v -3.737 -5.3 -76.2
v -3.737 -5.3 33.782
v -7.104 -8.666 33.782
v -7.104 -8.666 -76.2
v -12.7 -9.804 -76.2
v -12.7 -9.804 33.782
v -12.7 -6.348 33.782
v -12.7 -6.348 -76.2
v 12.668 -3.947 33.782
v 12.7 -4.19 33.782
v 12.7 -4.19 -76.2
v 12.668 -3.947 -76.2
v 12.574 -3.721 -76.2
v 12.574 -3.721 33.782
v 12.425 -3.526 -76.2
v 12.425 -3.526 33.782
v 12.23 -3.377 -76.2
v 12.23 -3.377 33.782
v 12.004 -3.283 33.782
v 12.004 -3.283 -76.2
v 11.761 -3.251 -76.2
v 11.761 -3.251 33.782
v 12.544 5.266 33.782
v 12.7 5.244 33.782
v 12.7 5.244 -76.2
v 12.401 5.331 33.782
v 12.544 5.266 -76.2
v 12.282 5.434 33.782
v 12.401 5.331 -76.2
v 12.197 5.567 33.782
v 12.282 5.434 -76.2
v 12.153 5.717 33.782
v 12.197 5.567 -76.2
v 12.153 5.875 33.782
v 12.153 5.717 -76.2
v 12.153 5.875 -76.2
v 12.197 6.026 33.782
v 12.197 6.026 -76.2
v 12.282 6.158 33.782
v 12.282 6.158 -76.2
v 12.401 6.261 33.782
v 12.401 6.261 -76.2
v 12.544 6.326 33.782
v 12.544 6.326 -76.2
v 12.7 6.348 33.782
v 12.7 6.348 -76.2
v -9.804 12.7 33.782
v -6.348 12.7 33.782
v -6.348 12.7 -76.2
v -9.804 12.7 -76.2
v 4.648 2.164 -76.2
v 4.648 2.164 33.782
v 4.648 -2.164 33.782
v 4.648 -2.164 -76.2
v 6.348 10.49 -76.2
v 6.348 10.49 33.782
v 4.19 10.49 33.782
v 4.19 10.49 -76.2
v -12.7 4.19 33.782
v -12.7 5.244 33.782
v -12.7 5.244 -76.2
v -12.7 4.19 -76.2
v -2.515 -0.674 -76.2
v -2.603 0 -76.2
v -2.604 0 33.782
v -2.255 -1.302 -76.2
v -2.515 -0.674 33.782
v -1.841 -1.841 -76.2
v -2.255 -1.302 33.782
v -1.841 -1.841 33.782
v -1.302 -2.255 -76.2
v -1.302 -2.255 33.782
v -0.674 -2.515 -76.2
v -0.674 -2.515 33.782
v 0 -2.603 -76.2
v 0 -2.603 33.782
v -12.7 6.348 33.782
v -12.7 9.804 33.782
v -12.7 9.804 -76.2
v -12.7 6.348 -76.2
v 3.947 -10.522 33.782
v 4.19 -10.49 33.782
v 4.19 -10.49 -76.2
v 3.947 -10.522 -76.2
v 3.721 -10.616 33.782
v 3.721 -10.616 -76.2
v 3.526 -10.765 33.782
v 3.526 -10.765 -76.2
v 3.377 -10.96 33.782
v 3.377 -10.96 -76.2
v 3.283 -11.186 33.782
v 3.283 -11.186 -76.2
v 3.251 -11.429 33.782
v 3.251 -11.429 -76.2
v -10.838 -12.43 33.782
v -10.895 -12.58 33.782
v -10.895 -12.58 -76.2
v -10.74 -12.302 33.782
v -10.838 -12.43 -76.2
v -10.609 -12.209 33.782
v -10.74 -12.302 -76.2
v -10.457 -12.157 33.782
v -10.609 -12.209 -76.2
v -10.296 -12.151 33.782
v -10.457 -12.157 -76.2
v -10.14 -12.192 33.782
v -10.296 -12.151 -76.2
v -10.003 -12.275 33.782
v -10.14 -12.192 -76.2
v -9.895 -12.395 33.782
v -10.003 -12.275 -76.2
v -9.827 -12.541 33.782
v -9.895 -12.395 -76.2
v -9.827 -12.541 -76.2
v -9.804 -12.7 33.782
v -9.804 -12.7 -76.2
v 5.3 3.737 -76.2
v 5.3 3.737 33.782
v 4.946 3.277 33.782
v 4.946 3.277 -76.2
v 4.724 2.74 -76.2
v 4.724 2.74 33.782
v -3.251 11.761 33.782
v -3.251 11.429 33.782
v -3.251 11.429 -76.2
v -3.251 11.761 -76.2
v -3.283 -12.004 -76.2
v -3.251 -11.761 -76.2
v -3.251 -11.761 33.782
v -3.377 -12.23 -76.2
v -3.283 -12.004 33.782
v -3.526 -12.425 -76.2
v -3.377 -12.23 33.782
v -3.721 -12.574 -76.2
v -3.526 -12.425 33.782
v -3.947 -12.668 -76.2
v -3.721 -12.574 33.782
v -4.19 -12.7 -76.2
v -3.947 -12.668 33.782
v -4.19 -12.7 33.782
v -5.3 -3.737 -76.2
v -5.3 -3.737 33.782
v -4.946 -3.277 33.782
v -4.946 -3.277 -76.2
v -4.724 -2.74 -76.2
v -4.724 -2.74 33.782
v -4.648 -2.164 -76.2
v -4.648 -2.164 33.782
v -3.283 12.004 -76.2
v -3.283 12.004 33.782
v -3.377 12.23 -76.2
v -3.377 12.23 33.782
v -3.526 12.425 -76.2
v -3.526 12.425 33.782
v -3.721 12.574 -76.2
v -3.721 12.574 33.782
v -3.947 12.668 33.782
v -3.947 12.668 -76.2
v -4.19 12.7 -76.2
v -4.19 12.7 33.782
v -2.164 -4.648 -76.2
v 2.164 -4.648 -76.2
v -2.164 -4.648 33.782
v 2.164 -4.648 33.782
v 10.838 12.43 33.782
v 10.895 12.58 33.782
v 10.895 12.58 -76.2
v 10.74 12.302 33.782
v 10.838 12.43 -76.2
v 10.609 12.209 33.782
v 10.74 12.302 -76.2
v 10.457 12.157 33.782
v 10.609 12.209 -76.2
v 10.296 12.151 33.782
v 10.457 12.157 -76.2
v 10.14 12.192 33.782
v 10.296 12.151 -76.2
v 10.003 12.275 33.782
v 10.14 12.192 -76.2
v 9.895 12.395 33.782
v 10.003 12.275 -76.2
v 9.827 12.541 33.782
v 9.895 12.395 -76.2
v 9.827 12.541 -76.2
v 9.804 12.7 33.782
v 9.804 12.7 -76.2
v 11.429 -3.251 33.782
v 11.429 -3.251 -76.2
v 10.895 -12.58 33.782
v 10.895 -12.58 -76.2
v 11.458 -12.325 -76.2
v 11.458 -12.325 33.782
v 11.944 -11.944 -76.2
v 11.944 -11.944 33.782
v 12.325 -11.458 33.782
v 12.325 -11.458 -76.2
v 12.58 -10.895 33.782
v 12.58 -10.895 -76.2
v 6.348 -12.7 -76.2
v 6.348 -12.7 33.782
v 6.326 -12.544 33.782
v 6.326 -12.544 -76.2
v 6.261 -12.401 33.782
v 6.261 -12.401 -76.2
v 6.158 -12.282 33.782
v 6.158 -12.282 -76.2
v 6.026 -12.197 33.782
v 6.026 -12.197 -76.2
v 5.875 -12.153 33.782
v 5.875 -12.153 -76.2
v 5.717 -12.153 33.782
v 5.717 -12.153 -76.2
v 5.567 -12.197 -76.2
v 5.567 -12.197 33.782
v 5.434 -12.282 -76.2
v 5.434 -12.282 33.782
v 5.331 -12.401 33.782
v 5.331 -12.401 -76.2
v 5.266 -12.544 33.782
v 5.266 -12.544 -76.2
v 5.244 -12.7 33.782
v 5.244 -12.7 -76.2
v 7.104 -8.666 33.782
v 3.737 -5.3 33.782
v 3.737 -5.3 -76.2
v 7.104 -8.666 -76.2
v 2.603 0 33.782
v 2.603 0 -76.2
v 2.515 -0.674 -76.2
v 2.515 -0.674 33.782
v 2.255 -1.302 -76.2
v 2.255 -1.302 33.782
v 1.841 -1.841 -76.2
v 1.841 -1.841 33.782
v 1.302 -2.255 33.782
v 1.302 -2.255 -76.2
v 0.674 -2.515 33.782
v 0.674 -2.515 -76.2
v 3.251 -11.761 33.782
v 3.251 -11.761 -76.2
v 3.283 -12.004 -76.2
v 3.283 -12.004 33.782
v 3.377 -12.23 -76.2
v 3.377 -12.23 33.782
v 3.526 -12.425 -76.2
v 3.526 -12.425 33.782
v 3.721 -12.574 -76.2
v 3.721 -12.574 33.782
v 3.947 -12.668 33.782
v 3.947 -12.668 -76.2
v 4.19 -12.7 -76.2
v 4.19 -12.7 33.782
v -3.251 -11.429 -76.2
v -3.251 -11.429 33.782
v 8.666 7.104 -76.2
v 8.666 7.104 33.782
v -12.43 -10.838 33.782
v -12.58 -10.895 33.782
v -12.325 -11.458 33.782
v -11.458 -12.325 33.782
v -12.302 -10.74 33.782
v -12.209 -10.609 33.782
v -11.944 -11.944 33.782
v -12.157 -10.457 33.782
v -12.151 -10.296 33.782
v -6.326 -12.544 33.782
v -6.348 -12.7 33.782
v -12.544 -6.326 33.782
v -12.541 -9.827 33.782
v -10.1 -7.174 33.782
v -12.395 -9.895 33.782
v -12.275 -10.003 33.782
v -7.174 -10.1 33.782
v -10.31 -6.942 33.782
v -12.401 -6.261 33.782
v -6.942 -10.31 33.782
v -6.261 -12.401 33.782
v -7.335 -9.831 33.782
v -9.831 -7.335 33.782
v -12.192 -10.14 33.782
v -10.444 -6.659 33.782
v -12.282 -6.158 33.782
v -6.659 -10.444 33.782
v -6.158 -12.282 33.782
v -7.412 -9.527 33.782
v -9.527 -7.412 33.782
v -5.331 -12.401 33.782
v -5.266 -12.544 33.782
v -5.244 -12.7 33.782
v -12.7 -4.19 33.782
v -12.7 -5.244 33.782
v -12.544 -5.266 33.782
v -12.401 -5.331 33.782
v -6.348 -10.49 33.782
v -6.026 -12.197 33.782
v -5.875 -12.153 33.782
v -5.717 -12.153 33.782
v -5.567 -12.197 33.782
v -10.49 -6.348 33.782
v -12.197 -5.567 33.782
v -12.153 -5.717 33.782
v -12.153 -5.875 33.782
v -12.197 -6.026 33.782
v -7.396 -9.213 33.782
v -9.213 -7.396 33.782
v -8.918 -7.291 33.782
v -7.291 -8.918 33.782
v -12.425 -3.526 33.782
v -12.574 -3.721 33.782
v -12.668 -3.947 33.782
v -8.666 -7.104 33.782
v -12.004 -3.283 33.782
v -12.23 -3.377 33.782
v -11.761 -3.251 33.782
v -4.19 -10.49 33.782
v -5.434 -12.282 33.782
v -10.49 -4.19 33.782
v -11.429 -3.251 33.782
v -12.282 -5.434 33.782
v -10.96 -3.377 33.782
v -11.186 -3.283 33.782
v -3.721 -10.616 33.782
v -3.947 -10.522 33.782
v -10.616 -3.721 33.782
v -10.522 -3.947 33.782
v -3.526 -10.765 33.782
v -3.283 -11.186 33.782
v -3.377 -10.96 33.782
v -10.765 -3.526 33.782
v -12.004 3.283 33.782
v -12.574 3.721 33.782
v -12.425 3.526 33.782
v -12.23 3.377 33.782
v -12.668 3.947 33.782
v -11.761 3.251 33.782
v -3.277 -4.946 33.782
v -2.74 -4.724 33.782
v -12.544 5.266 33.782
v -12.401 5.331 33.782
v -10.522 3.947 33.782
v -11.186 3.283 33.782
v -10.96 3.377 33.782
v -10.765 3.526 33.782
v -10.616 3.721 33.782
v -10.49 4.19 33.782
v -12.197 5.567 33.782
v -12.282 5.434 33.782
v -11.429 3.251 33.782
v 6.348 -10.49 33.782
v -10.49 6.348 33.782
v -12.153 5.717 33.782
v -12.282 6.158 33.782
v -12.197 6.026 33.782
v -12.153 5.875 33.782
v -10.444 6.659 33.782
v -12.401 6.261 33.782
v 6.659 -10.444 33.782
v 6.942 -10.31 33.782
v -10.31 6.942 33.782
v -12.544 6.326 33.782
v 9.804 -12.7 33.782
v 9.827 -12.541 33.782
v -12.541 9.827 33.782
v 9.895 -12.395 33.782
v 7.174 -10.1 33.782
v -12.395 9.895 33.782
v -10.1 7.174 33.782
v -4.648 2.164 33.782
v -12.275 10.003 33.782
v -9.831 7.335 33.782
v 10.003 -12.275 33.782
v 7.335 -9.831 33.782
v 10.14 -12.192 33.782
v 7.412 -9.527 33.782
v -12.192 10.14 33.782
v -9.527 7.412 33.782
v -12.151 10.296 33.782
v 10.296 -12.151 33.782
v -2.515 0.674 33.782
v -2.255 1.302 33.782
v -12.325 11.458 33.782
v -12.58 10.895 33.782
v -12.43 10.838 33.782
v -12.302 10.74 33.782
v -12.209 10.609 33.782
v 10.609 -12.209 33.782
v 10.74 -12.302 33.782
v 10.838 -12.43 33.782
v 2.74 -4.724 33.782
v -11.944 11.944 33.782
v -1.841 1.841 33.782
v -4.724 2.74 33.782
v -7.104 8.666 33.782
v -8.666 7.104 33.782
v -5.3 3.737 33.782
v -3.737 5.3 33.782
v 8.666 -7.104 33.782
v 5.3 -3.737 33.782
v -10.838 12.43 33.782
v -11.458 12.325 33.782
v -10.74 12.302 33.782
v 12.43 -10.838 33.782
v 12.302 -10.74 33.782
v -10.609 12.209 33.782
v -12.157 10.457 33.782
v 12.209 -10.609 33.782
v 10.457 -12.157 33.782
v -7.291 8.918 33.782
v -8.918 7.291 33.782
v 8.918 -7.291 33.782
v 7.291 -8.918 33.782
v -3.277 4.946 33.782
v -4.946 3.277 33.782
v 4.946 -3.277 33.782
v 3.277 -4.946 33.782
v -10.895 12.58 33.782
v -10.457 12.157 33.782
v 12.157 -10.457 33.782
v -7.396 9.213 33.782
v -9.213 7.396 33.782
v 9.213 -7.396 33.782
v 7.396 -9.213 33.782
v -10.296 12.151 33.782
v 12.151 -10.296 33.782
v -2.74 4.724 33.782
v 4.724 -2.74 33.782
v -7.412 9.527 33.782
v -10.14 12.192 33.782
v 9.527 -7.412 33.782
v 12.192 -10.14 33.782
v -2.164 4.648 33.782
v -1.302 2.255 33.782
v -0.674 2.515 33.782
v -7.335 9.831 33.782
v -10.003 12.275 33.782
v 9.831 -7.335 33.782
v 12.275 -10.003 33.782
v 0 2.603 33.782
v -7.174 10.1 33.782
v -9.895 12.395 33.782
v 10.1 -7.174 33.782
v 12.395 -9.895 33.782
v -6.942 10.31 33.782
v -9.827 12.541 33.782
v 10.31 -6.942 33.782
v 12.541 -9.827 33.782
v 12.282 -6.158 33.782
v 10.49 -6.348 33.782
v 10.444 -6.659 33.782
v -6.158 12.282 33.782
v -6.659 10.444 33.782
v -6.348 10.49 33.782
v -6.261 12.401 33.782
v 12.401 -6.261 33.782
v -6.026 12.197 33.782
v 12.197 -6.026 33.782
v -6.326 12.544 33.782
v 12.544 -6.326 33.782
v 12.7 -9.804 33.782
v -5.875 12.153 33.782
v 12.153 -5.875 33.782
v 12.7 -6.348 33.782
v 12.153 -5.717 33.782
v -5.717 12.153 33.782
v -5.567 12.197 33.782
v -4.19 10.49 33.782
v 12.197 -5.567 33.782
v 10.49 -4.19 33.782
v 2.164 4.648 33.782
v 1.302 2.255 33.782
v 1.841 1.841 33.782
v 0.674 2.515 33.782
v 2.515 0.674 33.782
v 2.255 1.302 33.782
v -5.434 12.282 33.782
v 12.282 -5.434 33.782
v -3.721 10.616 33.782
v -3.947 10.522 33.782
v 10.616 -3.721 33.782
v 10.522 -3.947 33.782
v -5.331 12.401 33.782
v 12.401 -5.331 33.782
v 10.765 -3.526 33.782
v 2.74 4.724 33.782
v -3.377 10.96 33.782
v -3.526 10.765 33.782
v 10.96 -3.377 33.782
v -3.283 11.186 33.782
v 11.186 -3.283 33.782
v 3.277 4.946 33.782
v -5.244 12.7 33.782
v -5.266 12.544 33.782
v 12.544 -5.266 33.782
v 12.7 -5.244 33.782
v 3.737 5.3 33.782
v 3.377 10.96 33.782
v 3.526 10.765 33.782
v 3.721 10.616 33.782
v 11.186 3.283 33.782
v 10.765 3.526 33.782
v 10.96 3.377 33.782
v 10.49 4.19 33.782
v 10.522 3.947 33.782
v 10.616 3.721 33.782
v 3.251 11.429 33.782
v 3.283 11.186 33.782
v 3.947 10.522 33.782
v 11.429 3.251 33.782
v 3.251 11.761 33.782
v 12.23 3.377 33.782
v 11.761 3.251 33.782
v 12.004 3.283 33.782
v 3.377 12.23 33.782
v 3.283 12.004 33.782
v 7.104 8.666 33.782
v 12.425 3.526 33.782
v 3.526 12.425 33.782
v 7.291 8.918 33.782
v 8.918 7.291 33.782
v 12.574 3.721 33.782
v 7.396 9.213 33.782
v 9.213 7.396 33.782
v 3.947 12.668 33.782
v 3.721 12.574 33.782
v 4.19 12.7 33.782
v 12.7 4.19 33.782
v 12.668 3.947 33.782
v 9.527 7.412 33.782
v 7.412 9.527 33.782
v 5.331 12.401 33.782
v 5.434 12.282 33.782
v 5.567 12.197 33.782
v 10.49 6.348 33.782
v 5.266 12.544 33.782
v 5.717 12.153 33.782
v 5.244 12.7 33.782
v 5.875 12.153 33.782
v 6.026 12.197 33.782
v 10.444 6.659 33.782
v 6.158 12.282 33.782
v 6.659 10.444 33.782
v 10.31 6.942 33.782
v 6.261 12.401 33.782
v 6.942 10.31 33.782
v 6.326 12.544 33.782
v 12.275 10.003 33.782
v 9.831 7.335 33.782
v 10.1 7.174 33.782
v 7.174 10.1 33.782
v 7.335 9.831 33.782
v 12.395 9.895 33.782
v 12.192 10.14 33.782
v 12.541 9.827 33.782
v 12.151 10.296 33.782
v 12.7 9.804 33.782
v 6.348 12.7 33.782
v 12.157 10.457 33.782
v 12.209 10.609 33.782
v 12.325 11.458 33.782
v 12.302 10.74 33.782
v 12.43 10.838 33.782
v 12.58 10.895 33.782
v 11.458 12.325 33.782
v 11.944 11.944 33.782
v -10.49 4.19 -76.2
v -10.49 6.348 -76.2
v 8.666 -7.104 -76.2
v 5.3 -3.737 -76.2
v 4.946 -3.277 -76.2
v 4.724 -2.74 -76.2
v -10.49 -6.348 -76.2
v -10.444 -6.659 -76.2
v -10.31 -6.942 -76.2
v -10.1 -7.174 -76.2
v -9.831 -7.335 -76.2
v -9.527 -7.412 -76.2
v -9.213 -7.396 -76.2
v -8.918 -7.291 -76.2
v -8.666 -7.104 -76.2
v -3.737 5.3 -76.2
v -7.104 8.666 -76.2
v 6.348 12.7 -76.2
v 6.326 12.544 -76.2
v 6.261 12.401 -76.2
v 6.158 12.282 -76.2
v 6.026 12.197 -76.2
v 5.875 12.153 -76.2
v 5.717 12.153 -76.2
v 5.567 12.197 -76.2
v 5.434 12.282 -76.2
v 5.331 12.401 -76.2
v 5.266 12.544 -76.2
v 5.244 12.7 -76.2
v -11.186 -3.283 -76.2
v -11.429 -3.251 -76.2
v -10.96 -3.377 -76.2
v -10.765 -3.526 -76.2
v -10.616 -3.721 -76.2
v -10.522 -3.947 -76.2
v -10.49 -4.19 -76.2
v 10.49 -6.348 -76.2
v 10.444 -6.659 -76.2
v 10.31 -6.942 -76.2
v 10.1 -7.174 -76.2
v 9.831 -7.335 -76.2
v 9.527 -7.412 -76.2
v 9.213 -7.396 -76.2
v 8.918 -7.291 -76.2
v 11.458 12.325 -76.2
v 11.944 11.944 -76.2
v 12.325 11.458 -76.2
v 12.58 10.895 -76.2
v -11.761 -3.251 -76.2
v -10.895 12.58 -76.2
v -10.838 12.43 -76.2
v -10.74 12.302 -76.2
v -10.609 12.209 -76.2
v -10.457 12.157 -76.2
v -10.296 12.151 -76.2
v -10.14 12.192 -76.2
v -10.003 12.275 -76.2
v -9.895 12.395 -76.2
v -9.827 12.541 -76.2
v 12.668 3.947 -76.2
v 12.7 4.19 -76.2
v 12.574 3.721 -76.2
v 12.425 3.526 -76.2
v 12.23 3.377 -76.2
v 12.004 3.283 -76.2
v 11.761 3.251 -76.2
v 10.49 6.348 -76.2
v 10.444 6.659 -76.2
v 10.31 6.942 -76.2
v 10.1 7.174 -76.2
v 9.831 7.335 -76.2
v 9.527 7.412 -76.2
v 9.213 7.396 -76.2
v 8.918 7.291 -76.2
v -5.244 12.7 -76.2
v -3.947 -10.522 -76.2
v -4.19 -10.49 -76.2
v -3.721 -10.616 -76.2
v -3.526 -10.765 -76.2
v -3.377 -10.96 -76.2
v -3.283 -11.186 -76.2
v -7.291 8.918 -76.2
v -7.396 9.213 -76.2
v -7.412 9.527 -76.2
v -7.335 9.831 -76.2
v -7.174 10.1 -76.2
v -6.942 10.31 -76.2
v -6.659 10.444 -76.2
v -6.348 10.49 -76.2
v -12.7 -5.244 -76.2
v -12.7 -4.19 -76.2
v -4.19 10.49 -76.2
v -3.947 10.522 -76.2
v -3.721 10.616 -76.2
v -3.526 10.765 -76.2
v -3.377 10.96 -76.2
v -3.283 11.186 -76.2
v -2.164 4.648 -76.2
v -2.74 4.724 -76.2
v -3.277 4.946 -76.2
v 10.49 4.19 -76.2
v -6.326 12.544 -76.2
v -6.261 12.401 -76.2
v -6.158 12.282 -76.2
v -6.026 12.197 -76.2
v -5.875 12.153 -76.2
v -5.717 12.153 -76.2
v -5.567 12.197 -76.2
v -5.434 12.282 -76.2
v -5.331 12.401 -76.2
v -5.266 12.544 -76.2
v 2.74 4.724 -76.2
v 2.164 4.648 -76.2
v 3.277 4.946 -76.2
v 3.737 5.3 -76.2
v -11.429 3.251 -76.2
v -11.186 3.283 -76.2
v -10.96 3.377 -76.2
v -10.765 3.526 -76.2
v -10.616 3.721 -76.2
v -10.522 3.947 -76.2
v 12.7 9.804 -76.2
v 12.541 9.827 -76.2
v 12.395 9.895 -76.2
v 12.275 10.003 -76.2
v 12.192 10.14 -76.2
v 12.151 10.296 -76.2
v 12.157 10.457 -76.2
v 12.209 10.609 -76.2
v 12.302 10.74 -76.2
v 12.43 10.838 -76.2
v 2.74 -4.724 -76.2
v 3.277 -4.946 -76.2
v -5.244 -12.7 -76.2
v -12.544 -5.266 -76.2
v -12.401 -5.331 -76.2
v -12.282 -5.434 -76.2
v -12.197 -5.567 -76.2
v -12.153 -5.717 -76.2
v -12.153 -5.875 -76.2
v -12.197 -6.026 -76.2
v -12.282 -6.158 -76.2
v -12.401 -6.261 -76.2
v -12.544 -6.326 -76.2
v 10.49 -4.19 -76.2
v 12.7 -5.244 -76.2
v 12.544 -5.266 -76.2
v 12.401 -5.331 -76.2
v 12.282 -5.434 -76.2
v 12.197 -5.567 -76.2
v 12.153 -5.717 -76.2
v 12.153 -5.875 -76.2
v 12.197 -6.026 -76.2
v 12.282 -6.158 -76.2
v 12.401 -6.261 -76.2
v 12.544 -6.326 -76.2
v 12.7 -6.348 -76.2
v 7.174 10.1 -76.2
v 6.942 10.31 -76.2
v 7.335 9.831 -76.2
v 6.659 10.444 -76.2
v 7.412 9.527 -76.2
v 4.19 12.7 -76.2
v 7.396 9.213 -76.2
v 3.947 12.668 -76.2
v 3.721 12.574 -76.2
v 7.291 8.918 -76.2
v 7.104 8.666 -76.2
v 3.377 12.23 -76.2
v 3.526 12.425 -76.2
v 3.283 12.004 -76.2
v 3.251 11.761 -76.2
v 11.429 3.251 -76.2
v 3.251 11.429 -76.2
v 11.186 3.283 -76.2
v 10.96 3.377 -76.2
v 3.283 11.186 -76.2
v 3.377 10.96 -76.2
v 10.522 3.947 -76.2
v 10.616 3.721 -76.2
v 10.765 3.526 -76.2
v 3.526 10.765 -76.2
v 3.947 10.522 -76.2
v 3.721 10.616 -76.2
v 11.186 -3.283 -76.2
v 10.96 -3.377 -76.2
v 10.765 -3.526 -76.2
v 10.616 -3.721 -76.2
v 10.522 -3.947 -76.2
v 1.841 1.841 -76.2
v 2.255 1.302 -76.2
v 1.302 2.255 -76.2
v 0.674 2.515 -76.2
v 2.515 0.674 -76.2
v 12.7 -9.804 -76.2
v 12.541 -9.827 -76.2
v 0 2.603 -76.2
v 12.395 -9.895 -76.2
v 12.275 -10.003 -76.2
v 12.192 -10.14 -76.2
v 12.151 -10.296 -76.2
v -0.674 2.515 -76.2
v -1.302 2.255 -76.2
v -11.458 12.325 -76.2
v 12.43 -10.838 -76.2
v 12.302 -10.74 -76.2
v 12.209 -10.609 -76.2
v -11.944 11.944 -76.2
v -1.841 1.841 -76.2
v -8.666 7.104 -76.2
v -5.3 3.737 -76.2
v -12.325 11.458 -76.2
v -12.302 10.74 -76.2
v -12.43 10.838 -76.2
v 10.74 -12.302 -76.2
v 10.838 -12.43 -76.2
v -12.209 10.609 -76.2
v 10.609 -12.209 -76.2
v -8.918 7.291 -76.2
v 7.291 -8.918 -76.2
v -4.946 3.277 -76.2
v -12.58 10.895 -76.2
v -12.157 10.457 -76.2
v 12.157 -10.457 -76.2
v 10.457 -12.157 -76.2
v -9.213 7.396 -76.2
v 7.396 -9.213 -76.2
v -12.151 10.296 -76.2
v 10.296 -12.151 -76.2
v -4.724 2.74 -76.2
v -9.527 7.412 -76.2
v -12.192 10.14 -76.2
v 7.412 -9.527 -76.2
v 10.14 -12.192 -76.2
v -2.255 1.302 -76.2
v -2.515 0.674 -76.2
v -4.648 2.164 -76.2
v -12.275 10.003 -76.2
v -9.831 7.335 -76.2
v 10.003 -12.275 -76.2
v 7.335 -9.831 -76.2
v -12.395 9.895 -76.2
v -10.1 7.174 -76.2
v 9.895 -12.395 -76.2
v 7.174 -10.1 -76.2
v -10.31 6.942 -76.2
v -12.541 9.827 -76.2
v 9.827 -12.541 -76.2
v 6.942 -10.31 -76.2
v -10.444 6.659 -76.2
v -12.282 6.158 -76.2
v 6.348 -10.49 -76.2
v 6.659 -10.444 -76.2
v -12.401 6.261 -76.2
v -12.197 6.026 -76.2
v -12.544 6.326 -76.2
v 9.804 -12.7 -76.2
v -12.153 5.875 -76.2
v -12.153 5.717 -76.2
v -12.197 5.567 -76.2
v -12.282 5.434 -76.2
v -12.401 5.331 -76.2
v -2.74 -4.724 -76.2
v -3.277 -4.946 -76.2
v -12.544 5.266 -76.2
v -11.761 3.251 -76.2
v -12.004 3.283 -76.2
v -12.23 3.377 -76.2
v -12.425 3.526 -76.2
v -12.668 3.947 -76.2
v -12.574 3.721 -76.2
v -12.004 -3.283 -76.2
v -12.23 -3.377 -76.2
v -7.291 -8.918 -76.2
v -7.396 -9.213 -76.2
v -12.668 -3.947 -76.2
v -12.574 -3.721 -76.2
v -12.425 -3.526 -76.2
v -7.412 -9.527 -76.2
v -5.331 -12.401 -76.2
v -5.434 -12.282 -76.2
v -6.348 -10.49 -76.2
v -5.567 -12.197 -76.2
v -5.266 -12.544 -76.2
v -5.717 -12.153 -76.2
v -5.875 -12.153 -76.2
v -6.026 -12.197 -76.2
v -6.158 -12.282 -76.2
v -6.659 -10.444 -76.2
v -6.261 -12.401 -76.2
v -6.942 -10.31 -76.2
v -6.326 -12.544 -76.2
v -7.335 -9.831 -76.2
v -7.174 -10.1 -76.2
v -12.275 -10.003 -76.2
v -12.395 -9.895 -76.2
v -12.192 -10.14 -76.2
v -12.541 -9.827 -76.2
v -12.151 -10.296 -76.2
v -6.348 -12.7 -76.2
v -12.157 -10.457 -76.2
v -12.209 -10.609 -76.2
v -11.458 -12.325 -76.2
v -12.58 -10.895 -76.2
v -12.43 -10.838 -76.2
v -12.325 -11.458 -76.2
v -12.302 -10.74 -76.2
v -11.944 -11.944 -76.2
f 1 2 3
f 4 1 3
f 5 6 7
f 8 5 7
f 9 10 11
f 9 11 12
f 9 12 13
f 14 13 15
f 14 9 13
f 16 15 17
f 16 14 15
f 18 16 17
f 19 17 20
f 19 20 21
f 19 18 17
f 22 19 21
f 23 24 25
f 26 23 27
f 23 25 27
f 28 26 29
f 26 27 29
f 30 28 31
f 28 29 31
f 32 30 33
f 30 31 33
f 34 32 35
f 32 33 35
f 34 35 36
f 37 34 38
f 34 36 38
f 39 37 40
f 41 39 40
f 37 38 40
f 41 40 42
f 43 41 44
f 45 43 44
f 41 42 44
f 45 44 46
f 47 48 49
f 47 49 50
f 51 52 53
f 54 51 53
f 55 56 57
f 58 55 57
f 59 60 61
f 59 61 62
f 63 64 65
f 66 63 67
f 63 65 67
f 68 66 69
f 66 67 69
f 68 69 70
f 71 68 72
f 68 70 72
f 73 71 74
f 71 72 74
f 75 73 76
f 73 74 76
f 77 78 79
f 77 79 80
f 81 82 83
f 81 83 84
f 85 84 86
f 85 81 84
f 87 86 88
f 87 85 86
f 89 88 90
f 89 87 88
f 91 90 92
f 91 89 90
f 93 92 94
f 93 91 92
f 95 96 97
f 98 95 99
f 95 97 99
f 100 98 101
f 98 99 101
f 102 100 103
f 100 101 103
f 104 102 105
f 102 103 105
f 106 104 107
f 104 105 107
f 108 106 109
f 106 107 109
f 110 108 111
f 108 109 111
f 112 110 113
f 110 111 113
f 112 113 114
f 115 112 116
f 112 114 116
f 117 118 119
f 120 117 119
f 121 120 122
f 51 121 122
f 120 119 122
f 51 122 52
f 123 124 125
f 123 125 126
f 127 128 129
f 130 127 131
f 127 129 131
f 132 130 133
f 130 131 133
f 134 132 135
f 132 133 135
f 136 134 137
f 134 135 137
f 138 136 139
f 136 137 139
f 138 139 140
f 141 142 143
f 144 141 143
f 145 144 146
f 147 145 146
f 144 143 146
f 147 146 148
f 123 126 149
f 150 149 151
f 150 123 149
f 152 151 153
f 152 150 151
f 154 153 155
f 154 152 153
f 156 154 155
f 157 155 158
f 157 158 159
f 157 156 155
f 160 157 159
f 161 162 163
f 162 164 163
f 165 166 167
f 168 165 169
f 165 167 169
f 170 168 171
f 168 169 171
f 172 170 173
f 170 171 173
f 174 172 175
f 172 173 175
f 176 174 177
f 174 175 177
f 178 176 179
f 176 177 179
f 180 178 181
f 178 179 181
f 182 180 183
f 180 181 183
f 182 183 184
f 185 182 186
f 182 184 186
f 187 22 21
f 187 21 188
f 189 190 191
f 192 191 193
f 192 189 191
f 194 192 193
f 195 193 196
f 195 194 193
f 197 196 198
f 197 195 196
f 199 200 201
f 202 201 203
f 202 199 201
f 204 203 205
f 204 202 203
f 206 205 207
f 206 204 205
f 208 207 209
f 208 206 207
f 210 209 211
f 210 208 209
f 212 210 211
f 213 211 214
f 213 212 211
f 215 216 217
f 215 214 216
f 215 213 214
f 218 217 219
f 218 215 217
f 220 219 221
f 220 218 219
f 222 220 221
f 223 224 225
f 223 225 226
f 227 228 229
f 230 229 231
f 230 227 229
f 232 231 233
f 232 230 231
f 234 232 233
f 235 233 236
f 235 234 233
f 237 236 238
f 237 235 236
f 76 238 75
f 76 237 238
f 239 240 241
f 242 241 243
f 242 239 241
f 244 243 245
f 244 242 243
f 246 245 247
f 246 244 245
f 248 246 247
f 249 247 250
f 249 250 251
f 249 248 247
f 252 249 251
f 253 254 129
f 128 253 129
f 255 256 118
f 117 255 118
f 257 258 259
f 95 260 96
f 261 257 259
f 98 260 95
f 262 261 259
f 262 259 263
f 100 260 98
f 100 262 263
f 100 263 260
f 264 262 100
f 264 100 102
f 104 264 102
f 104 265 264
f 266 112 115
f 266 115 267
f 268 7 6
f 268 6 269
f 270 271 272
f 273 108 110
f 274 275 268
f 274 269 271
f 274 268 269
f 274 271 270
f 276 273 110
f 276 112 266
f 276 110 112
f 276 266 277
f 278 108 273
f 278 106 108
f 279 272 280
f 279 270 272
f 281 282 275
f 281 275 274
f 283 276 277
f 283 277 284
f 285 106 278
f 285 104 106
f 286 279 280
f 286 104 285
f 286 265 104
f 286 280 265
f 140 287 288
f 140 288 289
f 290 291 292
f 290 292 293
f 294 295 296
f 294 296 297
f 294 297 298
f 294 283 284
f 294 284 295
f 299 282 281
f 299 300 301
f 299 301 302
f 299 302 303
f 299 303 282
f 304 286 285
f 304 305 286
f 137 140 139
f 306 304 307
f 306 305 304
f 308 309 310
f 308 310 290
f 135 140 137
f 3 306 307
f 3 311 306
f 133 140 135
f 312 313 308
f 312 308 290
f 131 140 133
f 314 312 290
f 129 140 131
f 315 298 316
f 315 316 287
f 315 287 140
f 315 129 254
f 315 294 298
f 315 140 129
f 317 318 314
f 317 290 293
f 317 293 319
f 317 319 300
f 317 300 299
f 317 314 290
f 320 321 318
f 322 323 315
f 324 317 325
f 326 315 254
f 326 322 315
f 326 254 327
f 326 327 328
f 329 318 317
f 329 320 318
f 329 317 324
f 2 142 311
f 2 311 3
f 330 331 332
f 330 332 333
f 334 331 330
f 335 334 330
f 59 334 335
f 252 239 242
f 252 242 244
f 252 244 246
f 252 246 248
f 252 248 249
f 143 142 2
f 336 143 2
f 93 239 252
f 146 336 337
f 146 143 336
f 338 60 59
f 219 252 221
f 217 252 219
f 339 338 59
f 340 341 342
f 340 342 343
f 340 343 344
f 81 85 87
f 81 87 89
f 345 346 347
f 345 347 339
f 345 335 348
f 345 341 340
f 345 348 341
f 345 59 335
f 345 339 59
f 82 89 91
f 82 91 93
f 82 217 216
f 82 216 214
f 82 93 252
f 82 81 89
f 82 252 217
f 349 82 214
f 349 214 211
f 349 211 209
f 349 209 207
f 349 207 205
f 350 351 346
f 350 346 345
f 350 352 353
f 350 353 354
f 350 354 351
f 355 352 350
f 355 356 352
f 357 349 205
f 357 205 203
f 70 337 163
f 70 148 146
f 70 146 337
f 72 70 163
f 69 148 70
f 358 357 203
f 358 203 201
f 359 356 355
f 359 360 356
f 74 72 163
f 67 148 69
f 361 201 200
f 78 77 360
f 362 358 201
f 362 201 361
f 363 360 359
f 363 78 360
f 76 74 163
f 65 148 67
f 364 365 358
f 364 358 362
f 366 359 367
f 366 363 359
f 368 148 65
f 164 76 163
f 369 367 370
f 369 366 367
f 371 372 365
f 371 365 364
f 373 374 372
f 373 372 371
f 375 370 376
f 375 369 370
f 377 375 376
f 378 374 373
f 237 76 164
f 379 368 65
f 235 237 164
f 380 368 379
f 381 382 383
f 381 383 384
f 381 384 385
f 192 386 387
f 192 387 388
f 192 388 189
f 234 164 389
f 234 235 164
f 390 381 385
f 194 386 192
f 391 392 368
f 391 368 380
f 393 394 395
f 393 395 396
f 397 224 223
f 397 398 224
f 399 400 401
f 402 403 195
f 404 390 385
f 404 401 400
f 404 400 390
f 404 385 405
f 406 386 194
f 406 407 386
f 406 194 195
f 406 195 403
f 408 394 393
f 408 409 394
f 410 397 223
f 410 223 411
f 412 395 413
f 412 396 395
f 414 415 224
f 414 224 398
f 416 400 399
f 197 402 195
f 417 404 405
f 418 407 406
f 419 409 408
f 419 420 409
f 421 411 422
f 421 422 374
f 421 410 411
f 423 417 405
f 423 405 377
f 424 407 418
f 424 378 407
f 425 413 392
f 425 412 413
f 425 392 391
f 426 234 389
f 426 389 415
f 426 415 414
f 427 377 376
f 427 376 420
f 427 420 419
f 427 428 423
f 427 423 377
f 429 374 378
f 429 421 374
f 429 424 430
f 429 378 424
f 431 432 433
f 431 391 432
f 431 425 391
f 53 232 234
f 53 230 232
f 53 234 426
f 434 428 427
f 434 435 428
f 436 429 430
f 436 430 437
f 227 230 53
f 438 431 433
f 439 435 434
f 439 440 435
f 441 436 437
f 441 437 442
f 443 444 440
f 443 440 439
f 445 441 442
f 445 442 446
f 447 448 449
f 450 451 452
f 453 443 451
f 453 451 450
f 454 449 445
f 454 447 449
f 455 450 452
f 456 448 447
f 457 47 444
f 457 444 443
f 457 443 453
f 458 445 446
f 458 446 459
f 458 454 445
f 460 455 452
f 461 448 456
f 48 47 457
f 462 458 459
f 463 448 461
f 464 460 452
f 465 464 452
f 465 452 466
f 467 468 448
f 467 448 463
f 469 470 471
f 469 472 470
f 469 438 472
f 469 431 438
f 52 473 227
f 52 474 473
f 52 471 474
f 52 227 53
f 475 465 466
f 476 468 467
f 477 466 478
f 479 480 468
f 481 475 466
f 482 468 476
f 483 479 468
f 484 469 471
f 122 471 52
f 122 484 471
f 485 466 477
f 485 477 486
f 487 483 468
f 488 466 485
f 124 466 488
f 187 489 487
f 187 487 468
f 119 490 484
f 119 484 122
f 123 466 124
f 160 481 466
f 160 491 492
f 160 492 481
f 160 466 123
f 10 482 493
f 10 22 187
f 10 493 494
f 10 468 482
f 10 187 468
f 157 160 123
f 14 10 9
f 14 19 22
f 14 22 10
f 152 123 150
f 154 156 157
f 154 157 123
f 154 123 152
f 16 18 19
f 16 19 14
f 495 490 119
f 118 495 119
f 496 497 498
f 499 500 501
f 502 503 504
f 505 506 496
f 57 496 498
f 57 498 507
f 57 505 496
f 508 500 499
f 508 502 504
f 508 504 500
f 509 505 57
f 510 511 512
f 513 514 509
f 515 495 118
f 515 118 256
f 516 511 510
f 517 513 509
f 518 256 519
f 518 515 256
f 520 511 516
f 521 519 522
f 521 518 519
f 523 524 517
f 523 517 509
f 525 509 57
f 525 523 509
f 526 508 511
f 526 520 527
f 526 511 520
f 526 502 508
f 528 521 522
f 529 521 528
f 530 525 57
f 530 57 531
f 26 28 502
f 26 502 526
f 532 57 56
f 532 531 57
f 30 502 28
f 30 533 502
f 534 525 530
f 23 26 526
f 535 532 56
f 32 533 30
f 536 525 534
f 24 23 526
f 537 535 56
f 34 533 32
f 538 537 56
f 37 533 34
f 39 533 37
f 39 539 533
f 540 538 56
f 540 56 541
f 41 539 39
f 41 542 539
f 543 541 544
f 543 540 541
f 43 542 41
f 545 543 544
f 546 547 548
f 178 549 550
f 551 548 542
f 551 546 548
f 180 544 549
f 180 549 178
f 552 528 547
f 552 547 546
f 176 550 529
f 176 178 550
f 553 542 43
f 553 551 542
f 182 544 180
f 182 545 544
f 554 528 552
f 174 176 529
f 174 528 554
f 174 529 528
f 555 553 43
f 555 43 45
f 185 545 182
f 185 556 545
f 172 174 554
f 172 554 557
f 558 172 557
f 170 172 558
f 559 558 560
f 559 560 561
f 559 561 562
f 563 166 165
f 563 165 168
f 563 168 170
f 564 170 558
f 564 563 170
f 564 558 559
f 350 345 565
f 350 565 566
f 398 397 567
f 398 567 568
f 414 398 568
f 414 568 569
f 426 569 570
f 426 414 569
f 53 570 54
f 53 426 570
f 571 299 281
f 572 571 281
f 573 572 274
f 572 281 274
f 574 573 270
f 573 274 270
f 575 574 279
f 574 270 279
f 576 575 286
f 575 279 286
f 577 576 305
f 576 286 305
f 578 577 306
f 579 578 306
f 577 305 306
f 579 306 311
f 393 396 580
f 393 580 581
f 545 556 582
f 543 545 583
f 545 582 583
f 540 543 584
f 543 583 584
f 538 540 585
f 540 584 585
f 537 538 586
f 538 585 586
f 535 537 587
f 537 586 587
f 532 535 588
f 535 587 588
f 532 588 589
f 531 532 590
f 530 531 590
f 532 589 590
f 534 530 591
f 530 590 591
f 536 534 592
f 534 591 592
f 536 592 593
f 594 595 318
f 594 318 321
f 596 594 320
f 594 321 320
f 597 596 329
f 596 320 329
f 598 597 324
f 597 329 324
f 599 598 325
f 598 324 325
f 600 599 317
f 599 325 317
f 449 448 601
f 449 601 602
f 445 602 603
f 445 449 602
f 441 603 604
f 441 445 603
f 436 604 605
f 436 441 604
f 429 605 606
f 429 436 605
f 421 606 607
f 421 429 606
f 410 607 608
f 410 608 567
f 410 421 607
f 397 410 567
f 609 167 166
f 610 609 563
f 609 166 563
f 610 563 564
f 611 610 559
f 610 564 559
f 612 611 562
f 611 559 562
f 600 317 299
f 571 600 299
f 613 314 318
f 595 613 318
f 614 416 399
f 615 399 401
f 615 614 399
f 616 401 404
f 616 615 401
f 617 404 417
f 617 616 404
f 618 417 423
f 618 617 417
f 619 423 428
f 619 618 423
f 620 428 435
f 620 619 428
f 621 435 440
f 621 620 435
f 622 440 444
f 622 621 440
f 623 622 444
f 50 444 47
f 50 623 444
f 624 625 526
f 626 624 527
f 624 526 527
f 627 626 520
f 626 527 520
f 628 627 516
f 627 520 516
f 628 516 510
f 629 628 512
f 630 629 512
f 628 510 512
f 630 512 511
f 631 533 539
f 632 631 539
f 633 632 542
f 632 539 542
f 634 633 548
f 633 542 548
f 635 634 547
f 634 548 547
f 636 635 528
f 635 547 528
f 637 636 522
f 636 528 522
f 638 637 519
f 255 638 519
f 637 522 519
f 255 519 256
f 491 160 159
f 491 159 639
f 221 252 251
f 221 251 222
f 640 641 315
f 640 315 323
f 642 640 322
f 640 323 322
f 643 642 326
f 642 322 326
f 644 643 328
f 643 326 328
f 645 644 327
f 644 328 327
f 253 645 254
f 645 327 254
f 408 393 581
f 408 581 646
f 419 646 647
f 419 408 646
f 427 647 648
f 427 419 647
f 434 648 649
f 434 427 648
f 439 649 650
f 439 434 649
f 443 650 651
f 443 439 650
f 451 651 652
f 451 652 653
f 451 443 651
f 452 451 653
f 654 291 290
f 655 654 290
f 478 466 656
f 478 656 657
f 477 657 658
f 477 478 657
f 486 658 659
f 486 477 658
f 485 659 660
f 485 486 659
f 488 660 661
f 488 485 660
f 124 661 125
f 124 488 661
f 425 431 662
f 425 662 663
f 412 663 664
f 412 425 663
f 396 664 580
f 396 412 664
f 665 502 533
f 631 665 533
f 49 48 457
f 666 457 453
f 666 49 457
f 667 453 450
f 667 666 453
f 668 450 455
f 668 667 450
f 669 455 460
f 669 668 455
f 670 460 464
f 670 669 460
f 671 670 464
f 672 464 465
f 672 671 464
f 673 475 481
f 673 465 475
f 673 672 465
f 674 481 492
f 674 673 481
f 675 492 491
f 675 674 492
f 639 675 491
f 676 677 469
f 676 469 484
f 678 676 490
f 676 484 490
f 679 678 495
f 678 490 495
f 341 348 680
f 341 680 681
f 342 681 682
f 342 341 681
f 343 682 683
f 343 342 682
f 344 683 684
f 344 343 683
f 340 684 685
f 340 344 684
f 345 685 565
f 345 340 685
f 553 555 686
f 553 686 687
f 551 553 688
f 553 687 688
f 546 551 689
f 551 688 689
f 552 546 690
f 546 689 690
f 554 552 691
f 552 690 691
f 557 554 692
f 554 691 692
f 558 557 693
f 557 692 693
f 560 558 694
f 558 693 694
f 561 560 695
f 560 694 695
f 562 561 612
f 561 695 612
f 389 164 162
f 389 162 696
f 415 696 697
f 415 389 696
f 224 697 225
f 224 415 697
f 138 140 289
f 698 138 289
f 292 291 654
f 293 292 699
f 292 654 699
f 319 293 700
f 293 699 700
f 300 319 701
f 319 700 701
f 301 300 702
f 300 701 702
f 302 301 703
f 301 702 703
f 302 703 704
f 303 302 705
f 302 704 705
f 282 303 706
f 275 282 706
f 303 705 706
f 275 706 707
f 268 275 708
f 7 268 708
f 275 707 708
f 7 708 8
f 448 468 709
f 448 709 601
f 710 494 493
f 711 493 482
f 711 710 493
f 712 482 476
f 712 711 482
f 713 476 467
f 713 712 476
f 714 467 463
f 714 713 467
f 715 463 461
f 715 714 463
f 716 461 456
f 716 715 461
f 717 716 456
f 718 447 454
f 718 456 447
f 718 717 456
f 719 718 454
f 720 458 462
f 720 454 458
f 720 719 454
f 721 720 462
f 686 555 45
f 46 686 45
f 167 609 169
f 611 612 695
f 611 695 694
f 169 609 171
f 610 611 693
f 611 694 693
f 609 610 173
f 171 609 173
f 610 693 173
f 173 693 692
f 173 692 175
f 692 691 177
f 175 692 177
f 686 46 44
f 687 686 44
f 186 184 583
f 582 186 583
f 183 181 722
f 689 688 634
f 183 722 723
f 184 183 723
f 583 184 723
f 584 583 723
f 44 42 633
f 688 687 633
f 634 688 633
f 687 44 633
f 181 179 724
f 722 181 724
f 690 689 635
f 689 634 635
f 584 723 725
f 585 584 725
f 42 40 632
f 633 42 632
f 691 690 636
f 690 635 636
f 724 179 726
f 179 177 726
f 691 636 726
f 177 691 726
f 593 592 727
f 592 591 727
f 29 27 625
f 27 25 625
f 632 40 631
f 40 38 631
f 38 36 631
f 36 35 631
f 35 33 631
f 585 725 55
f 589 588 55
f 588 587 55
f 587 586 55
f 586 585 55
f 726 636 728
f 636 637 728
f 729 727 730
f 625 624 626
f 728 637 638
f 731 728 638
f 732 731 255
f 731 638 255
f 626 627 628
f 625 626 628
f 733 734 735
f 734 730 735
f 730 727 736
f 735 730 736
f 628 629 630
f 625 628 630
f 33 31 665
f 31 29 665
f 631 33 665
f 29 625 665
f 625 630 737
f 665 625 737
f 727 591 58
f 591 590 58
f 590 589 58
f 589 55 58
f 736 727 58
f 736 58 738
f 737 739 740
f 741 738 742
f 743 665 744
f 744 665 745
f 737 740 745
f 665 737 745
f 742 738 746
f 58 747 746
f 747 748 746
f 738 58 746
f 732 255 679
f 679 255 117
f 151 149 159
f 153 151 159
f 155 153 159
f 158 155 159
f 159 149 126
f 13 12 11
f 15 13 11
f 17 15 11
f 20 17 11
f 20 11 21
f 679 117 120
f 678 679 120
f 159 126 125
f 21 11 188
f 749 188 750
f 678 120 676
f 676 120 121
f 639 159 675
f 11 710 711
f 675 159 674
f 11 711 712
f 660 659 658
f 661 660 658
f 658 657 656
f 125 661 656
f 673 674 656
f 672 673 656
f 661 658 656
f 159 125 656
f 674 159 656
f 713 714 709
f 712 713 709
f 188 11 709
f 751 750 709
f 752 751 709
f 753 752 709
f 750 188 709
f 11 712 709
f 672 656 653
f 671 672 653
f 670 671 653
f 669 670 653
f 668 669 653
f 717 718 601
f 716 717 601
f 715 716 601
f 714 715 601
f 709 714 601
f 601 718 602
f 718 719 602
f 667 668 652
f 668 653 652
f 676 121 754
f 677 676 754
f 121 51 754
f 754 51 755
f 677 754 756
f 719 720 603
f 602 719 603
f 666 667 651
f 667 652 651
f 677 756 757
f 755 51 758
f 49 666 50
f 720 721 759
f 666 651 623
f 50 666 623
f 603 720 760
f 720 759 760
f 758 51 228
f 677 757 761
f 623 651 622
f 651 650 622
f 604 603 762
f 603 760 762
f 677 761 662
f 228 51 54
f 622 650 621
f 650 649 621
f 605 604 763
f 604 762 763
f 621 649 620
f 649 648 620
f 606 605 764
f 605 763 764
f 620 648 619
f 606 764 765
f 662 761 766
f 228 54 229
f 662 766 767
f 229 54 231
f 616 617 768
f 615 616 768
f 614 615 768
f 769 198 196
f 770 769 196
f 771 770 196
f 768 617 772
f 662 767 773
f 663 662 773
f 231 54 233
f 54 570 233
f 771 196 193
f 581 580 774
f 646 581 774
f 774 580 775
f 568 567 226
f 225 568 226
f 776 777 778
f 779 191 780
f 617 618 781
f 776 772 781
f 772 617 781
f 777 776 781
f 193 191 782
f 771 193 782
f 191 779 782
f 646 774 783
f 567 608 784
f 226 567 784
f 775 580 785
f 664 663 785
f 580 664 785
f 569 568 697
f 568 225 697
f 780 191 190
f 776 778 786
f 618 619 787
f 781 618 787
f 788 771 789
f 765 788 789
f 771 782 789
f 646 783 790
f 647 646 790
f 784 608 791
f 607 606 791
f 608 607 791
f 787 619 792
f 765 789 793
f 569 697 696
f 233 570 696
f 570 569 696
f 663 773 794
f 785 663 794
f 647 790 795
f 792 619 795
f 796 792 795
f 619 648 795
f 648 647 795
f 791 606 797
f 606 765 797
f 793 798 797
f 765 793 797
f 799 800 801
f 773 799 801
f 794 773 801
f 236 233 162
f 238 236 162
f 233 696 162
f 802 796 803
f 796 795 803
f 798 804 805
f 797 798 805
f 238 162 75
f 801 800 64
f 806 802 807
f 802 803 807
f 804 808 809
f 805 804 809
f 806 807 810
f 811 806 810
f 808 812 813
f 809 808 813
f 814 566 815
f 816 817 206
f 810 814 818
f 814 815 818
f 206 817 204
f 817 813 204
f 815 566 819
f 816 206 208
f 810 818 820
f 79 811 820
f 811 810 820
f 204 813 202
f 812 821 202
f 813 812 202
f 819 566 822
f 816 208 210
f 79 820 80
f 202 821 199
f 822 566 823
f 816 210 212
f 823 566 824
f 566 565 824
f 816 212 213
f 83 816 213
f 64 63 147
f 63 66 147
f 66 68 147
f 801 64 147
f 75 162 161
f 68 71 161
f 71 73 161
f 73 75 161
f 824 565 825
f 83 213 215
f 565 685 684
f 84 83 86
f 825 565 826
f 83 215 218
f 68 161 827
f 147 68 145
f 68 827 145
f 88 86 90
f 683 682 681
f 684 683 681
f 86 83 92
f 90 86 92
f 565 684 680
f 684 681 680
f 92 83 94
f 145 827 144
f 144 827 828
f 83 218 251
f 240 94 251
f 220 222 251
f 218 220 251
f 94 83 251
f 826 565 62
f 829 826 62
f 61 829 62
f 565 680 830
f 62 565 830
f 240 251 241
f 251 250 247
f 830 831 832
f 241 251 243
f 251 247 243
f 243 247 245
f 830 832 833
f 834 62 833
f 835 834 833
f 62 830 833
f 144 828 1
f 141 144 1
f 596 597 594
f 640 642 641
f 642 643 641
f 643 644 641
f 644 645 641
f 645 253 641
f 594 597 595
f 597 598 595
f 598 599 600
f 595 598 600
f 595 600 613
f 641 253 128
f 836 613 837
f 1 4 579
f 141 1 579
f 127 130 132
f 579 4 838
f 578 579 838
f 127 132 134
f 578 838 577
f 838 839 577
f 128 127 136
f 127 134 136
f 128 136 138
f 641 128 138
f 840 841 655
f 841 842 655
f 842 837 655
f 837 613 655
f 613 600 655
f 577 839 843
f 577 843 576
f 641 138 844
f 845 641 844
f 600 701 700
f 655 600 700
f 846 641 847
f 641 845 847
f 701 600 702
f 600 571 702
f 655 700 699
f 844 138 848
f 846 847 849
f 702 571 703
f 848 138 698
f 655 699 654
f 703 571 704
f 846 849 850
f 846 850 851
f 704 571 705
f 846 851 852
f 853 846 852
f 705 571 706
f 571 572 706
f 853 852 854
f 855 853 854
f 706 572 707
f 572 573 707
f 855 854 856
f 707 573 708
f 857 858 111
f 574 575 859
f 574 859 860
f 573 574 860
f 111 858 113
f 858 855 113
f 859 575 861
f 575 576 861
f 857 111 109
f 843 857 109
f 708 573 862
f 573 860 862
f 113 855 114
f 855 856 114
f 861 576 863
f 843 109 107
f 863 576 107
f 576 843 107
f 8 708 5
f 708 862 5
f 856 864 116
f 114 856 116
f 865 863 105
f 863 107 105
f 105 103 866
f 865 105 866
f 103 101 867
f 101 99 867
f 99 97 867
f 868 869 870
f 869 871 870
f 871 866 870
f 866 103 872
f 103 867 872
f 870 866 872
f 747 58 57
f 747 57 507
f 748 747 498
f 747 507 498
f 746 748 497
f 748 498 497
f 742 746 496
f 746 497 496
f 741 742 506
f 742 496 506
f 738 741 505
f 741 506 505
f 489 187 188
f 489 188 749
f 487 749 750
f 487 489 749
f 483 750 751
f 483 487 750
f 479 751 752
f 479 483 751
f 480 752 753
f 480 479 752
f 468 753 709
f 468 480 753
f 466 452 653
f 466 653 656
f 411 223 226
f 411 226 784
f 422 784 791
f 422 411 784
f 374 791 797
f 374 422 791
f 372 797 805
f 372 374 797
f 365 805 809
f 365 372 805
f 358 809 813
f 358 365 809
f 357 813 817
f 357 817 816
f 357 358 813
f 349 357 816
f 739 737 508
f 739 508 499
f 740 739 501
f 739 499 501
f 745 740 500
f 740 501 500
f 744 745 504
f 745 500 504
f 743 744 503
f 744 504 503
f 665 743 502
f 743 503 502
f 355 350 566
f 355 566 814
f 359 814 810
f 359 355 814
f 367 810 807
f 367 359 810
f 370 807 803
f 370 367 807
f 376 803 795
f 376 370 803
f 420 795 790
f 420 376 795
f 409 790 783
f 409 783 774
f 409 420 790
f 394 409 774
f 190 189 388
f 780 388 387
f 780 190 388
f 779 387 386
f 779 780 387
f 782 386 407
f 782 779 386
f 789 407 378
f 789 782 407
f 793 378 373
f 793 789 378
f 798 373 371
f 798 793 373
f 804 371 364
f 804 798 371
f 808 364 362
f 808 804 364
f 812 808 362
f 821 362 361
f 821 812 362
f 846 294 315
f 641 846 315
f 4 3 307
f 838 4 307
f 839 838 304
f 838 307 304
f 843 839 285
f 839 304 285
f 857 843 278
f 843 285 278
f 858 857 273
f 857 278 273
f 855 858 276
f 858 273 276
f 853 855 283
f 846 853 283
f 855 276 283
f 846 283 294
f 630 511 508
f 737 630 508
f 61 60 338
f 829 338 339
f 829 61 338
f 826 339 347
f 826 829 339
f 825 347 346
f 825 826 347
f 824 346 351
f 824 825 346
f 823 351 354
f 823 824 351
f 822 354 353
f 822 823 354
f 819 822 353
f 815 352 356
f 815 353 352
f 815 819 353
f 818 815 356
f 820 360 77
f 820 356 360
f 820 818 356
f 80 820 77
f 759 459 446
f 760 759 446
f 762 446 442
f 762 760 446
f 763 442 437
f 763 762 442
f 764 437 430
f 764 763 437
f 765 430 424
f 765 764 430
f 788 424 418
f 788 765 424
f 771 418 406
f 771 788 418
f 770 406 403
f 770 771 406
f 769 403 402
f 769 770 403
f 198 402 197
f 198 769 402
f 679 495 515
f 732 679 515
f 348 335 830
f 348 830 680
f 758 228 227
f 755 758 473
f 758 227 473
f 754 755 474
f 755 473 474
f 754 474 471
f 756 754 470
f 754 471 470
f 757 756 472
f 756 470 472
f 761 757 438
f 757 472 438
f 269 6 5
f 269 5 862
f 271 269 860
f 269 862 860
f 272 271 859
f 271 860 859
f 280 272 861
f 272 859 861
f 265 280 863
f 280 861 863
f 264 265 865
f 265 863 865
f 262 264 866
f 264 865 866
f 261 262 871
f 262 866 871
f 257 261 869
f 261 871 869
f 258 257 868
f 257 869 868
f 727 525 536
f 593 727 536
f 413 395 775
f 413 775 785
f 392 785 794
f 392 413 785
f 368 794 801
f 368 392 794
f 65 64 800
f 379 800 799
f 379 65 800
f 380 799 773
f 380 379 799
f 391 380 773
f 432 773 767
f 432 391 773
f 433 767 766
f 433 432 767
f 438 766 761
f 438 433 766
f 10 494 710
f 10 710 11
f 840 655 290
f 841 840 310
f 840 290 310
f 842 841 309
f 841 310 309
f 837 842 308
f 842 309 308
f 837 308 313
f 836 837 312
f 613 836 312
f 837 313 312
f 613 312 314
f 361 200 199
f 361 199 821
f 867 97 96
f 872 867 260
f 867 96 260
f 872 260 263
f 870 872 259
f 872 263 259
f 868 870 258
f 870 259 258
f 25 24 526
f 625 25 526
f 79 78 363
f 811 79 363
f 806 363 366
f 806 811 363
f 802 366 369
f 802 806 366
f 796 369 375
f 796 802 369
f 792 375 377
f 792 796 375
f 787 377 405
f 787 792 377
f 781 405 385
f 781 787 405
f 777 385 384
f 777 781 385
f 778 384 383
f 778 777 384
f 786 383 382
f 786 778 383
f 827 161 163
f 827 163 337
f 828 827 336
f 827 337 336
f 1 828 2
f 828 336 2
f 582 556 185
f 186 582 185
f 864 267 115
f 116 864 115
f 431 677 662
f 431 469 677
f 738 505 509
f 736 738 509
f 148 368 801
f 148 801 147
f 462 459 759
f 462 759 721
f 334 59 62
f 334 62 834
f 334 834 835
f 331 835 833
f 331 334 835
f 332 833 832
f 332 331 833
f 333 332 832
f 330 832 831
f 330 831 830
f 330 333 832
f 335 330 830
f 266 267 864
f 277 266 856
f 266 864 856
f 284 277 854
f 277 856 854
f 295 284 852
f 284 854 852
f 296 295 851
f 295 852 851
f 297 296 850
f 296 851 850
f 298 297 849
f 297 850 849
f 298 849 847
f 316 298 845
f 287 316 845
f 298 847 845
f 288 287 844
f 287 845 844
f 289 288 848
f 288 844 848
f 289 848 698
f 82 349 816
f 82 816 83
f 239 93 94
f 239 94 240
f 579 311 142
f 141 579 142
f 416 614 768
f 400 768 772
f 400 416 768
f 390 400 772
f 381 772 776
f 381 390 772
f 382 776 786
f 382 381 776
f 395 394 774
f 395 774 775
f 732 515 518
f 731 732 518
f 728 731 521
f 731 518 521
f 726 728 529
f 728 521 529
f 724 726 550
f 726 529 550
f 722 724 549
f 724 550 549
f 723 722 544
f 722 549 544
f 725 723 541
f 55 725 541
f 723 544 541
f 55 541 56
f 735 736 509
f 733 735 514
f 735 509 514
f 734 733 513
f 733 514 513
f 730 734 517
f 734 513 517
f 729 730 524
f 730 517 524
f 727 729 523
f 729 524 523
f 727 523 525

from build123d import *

# Parameters (mm, degrees)
BOSS_EXTRUDE1_DEPTH     = 76.2
CUT_EXTRUDE1_DEPTH      = 79.288057838
CUT_EXTRUDE1_DEPTH_BACK = 79.288057838
SKETCH5_R               = 0.55245
SKETCH6_R               = 2.6035
CUT_EXTRUDE3_DEPTH      = 42.418


with BuildPart() as part:
    # Sketch4 → Boss-Extrude1 (new, symmetric)
    with BuildSketch(Plane.XY):
        with BuildLine():
            Line((4.190365, -12.7), (10.11729625, -12.7))
            ThreePointArc((10.11729625, -12.7), (11.943543585, -11.943543585), (12.7, -10.11729625))
            Line((12.7, -10.11729625), (12.7, -4.190365))
            ThreePointArc((12.7, -4.190365), (12.42492494, -3.52627506), (11.760835, -3.2512))
            Line((11.760835, -3.2512), (11.429365, -3.2512))
            ThreePointArc((11.429365, -3.2512), (10.76527506, -3.52627506), (10.4902, -4.190365))
            Line((10.4902, -4.190365), (10.4902, -6.348478019))
            ThreePointArc((10.4902, -6.348478019), (9.830707141, -7.335478831), (8.666460301, -7.103895736))
            Line((8.666460301, -7.103895736), (5.299899128, -3.737334563))
            ThreePointArc((5.299899128, -3.737334563), (4.817571085, -3.015479634), (4.6482, -2.16399369))
            Line((4.6482, -2.16399369), (4.6482, 0))
            Line((4.6482, 0), (2.6035, 0))
            ThreePointArc((2.6035, 0), (1.840952505, -1.840952505), (0, -2.6035))
            Line((0, -2.6035), (0, -4.6482))
            Line((0, -4.6482), (2.16399369, -4.6482))
            ThreePointArc((2.16399369, -4.6482), (3.015479634, -4.817571085), (3.737334563, -5.299899128))
            Line((3.737334563, -5.299899128), (7.103895736, -8.666460301))
            ThreePointArc((7.103895736, -8.666460301), (7.335478831, -9.830707141), (6.348478019, -10.4902))
            Line((6.348478019, -10.4902), (4.190365, -10.4902))
            ThreePointArc((4.190365, -10.4902), (3.52627506, -10.76527506), (3.2512, -11.429365))
            Line((3.2512, -11.429365), (3.2512, -11.760835))
            ThreePointArc((3.2512, -11.760835), (3.52627506, -12.42492494), (4.190365, -12.7))
        make_face()
    extrude(amount=BOSS_EXTRUDE1_DEPTH, both=True)

    # Sketch5 → Cut-Extrude1 (cut, two sides: drawn at the far end of the back side and taken through both)
    with BuildSketch(Plane.XY.offset(-CUT_EXTRUDE1_DEPTH_BACK)):
        with Locations((10.356153152, -12.7)):
            Circle(SKETCH5_R)
        with Locations((5.796028019, -12.7)):
            Circle(SKETCH5_R)
        with Locations((12.7, -10.356153152)):
            Circle(SKETCH5_R)
        with Locations((12.7, -5.796028019)):
            Circle(SKETCH5_R)
    extrude(amount=CUT_EXTRUDE1_DEPTH + CUT_EXTRUDE1_DEPTH_BACK, mode=Mode.SUBTRACT)

    # Mirror1: part across plane


with BuildPart() as part_1:
    add(part.part)
    add(part.part.mirror(Plane(origin=(0, 0, 0), x_dir=(0, 0, 1), z_dir=(1, 0, 0))))

    # Mirror2: part across plane


with BuildPart() as part_2:
    add(part_1.part)
    add(part_1.part.mirror(Plane.ZX))

    # Sketch6 → Cut-Extrude3 (cut)
    with BuildSketch(Plane.XY.offset(76.2)):
        with BuildLine():
            Line((12.7, -5.243578019), (12.7, -4.190365))
            ThreePointArc((12.7, -4.190365), (12.42492494, -3.52627506), (11.760835, -3.2512))
            Line((11.760835, -3.2512), (11.429365, -3.2512))
            ThreePointArc((11.429365, -3.2512), (10.76527506, -3.52627506), (10.4902, -4.190365))
            Line((10.4902, -4.190365), (10.4902, -6.348478019))
            ThreePointArc((10.4902, -6.348478019), (9.830707141, -7.335478831), (8.666460301, -7.103895736))
            Line((8.666460301, -7.103895736), (5.299899128, -3.737334563))
            ThreePointArc((5.299899128, -3.737334563), (4.817571085, -3.015479634), (4.6482, -2.16399369))
            Line((4.6482, -2.16399369), (4.6482, 2.16399369))
            ThreePointArc((4.6482, 2.16399369), (4.817571085, 3.015479634), (5.299899128, 3.737334563))
            Line((5.299899128, 3.737334563), (8.666460301, 7.103895736))
            ThreePointArc((8.666460301, 7.103895736), (9.830707141, 7.335478831), (10.4902, 6.348478019))
            Line((10.4902, 6.348478019), (10.4902, 4.190365))
            ThreePointArc((10.4902, 4.190365), (10.76527506, 3.52627506), (11.429365, 3.2512))
            Line((11.429365, 3.2512), (11.760835, 3.2512))
            ThreePointArc((11.760835, 3.2512), (12.42492494, 3.52627506), (12.7, 4.190365))
            Line((12.7, 4.190365), (12.7, 5.243578019))
            ThreePointArc((12.7, 5.243578019), (12.14755, 5.796028019), (12.7, 6.348478019))
            Line((12.7, 6.348478019), (12.7, 9.803703152))
            ThreePointArc((12.7, 9.803703152), (12.150857656, 10.295790178), (12.579996867, 10.895412135))
            ThreePointArc((12.579996867, 10.895412135), (11.943543585, 11.943543585), (10.895412135, 12.579996867))
            ThreePointArc((10.895412135, 12.579996867), (10.295790178, 12.150857656), (9.803703152, 12.7))
            Line((9.803703152, 12.7), (6.348478019, 12.7))
            ThreePointArc((6.348478019, 12.7), (5.796028019, 12.14755), (5.243578019, 12.7))
            Line((5.243578019, 12.7), (4.190365, 12.7))
            ThreePointArc((4.190365, 12.7), (3.52627506, 12.42492494), (3.2512, 11.760835))
            Line((3.2512, 11.760835), (3.2512, 11.429365))
            ThreePointArc((3.2512, 11.429365), (3.52627506, 10.76527506), (4.190365, 10.4902))
            Line((4.190365, 10.4902), (6.348478019, 10.4902))
            ThreePointArc((6.348478019, 10.4902), (7.335478831, 9.830707141), (7.103895736, 8.666460301))
            Line((7.103895736, 8.666460301), (3.737334563, 5.299899128))
            ThreePointArc((3.737334563, 5.299899128), (3.015479634, 4.817571085), (2.16399369, 4.6482))
            Line((2.16399369, 4.6482), (-2.16399369, 4.6482))
            ThreePointArc((-2.16399369, 4.6482), (-3.015479634, 4.817571085), (-3.737334563, 5.299899128))
            Line((-3.737334563, 5.299899128), (-7.103895736, 8.666460301))
            ThreePointArc((-7.103895736, 8.666460301), (-7.335478831, 9.830707141), (-6.348478019, 10.4902))
            Line((-6.348478019, 10.4902), (-4.190365, 10.4902))
            ThreePointArc((-4.190365, 10.4902), (-3.52627506, 10.76527506), (-3.2512, 11.429365))
            Line((-3.2512, 11.429365), (-3.2512, 11.760835))
            ThreePointArc((-3.2512, 11.760835), (-3.52627506, 12.42492494), (-4.190365, 12.7))
            Line((-4.190365, 12.7), (-5.243578019, 12.7))
            ThreePointArc((-5.243578019, 12.7), (-5.796028019, 12.14755), (-6.348478019, 12.7))
            Line((-6.348478019, 12.7), (-9.803703152, 12.7))
            ThreePointArc((-9.803703152, 12.7), (-10.295790178, 12.150857656), (-10.895412135, 12.579996867))
            ThreePointArc((-10.895412135, 12.579996867), (-11.943543585, 11.943543585), (-12.579996867, 10.895412135))
            ThreePointArc((-12.579996867, 10.895412135), (-12.150857656, 10.295790178), (-12.7, 9.803703152))
            Line((-12.7, 9.803703152), (-12.7, 6.348478019))
            ThreePointArc((-12.7, 6.348478019), (-12.14755, 5.796028019), (-12.7, 5.243578019))
            Line((-12.7, 5.243578019), (-12.7, 4.190365))
            ThreePointArc((-12.7, 4.190365), (-12.42492494, 3.52627506), (-11.760835, 3.2512))
            Line((-11.760835, 3.2512), (-11.429365, 3.2512))
            ThreePointArc((-11.429365, 3.2512), (-10.76527506, 3.52627506), (-10.4902, 4.190365))
            Line((-10.4902, 4.190365), (-10.4902, 6.348478019))
            ThreePointArc((-10.4902, 6.348478019), (-9.830707141, 7.335478831), (-8.666460301, 7.103895736))
            Line((-8.666460301, 7.103895736), (-5.299899128, 3.737334563))
            ThreePointArc((-5.299899128, 3.737334563), (-4.817571085, 3.015479634), (-4.6482, 2.16399369))
            Line((-4.6482, 2.16399369), (-4.6482, -2.16399369))
            ThreePointArc((-4.6482, -2.16399369), (-4.817571085, -3.015479634), (-5.299899128, -3.737334563))
            Line((-5.299899128, -3.737334563), (-8.666460301, -7.103895736))
            ThreePointArc((-8.666460301, -7.103895736), (-9.830707141, -7.335478831), (-10.4902, -6.348478019))
            Line((-10.4902, -6.348478019), (-10.4902, -4.190365))
            ThreePointArc((-10.4902, -4.190365), (-10.76527506, -3.52627506), (-11.429365, -3.2512))
            Line((-11.429365, -3.2512), (-11.760835, -3.2512))
            ThreePointArc((-11.760835, -3.2512), (-12.42492494, -3.52627506), (-12.7, -4.190365))
            Line((-12.7, -4.190365), (-12.7, -5.243578019))
            ThreePointArc((-12.7, -5.243578019), (-12.14755, -5.796028019), (-12.7, -6.348478019))
            Line((-12.7, -6.348478019), (-12.7, -9.803703152))
            ThreePointArc((-12.7, -9.803703152), (-12.150857656, -10.295790178), (-12.579996867, -10.895412135))
            ThreePointArc((-12.579996867, -10.895412135), (-11.943543585, -11.943543585), (-10.895412135, -12.579996867))
            ThreePointArc((-10.895412135, -12.579996867), (-10.295790178, -12.150857656), (-9.803703152, -12.7))
            Line((-9.803703152, -12.7), (-6.348478019, -12.7))
            ThreePointArc((-6.348478019, -12.7), (-5.796028019, -12.14755), (-5.243578019, -12.7))
            Line((-5.243578019, -12.7), (-4.190365, -12.7))
            ThreePointArc((-4.190365, -12.7), (-3.52627506, -12.42492494), (-3.2512, -11.760835))
            Line((-3.2512, -11.760835), (-3.2512, -11.429365))
            ThreePointArc((-3.2512, -11.429365), (-3.52627506, -10.76527506), (-4.190365, -10.4902))
            Line((-4.190365, -10.4902), (-6.348478019, -10.4902))
            ThreePointArc((-6.348478019, -10.4902), (-7.335478831, -9.830707141), (-7.103895736, -8.666460301))
            Line((-7.103895736, -8.666460301), (-3.737334563, -5.299899128))
            ThreePointArc((-3.737334563, -5.299899128), (-3.015479634, -4.817571085), (-2.16399369, -4.6482))
            Line((-2.16399369, -4.6482), (2.16399369, -4.6482))
            ThreePointArc((2.16399369, -4.6482), (3.015479634, -4.817571085), (3.737334563, -5.299899128))
            Line((3.737334563, -5.299899128), (7.103895736, -8.666460301))
            ThreePointArc((7.103895736, -8.666460301), (7.335478831, -9.830707141), (6.348478019, -10.4902))
            Line((6.348478019, -10.4902), (4.190365, -10.4902))
            ThreePointArc((4.190365, -10.4902), (3.52627506, -10.76527506), (3.2512, -11.429365))
            Line((3.2512, -11.429365), (3.2512, -11.760835))
            ThreePointArc((3.2512, -11.760835), (3.52627506, -12.42492494), (4.190365, -12.7))
            Line((4.190365, -12.7), (5.243578019, -12.7))
            ThreePointArc((5.243578019, -12.7), (5.796028019, -12.14755), (6.348478019, -12.7))
            Line((6.348478019, -12.7), (9.803703152, -12.7))
            ThreePointArc((9.803703152, -12.7), (10.295790178, -12.150857656), (10.895412135, -12.579996867))
            ThreePointArc((10.895412135, -12.579996867), (11.943543585, -11.943543585), (12.579996867, -10.895412135))
            ThreePointArc((12.579996867, -10.895412135), (12.150857656, -10.295790178), (12.7, -9.803703152))
            Line((12.7, -9.803703152), (12.7, -6.348478019))
            ThreePointArc((12.7, -6.348478019), (12.14755, -5.796028019), (12.7, -5.243578019))
        make_face()
        with Locations(Location((0, 0, 0), (0, 0, 180))):
            Circle(SKETCH6_R, mode=Mode.SUBTRACT)
    extrude(amount=-CUT_EXTRUDE3_DEPTH, mode=Mode.SUBTRACT)


solid = part_2.part
